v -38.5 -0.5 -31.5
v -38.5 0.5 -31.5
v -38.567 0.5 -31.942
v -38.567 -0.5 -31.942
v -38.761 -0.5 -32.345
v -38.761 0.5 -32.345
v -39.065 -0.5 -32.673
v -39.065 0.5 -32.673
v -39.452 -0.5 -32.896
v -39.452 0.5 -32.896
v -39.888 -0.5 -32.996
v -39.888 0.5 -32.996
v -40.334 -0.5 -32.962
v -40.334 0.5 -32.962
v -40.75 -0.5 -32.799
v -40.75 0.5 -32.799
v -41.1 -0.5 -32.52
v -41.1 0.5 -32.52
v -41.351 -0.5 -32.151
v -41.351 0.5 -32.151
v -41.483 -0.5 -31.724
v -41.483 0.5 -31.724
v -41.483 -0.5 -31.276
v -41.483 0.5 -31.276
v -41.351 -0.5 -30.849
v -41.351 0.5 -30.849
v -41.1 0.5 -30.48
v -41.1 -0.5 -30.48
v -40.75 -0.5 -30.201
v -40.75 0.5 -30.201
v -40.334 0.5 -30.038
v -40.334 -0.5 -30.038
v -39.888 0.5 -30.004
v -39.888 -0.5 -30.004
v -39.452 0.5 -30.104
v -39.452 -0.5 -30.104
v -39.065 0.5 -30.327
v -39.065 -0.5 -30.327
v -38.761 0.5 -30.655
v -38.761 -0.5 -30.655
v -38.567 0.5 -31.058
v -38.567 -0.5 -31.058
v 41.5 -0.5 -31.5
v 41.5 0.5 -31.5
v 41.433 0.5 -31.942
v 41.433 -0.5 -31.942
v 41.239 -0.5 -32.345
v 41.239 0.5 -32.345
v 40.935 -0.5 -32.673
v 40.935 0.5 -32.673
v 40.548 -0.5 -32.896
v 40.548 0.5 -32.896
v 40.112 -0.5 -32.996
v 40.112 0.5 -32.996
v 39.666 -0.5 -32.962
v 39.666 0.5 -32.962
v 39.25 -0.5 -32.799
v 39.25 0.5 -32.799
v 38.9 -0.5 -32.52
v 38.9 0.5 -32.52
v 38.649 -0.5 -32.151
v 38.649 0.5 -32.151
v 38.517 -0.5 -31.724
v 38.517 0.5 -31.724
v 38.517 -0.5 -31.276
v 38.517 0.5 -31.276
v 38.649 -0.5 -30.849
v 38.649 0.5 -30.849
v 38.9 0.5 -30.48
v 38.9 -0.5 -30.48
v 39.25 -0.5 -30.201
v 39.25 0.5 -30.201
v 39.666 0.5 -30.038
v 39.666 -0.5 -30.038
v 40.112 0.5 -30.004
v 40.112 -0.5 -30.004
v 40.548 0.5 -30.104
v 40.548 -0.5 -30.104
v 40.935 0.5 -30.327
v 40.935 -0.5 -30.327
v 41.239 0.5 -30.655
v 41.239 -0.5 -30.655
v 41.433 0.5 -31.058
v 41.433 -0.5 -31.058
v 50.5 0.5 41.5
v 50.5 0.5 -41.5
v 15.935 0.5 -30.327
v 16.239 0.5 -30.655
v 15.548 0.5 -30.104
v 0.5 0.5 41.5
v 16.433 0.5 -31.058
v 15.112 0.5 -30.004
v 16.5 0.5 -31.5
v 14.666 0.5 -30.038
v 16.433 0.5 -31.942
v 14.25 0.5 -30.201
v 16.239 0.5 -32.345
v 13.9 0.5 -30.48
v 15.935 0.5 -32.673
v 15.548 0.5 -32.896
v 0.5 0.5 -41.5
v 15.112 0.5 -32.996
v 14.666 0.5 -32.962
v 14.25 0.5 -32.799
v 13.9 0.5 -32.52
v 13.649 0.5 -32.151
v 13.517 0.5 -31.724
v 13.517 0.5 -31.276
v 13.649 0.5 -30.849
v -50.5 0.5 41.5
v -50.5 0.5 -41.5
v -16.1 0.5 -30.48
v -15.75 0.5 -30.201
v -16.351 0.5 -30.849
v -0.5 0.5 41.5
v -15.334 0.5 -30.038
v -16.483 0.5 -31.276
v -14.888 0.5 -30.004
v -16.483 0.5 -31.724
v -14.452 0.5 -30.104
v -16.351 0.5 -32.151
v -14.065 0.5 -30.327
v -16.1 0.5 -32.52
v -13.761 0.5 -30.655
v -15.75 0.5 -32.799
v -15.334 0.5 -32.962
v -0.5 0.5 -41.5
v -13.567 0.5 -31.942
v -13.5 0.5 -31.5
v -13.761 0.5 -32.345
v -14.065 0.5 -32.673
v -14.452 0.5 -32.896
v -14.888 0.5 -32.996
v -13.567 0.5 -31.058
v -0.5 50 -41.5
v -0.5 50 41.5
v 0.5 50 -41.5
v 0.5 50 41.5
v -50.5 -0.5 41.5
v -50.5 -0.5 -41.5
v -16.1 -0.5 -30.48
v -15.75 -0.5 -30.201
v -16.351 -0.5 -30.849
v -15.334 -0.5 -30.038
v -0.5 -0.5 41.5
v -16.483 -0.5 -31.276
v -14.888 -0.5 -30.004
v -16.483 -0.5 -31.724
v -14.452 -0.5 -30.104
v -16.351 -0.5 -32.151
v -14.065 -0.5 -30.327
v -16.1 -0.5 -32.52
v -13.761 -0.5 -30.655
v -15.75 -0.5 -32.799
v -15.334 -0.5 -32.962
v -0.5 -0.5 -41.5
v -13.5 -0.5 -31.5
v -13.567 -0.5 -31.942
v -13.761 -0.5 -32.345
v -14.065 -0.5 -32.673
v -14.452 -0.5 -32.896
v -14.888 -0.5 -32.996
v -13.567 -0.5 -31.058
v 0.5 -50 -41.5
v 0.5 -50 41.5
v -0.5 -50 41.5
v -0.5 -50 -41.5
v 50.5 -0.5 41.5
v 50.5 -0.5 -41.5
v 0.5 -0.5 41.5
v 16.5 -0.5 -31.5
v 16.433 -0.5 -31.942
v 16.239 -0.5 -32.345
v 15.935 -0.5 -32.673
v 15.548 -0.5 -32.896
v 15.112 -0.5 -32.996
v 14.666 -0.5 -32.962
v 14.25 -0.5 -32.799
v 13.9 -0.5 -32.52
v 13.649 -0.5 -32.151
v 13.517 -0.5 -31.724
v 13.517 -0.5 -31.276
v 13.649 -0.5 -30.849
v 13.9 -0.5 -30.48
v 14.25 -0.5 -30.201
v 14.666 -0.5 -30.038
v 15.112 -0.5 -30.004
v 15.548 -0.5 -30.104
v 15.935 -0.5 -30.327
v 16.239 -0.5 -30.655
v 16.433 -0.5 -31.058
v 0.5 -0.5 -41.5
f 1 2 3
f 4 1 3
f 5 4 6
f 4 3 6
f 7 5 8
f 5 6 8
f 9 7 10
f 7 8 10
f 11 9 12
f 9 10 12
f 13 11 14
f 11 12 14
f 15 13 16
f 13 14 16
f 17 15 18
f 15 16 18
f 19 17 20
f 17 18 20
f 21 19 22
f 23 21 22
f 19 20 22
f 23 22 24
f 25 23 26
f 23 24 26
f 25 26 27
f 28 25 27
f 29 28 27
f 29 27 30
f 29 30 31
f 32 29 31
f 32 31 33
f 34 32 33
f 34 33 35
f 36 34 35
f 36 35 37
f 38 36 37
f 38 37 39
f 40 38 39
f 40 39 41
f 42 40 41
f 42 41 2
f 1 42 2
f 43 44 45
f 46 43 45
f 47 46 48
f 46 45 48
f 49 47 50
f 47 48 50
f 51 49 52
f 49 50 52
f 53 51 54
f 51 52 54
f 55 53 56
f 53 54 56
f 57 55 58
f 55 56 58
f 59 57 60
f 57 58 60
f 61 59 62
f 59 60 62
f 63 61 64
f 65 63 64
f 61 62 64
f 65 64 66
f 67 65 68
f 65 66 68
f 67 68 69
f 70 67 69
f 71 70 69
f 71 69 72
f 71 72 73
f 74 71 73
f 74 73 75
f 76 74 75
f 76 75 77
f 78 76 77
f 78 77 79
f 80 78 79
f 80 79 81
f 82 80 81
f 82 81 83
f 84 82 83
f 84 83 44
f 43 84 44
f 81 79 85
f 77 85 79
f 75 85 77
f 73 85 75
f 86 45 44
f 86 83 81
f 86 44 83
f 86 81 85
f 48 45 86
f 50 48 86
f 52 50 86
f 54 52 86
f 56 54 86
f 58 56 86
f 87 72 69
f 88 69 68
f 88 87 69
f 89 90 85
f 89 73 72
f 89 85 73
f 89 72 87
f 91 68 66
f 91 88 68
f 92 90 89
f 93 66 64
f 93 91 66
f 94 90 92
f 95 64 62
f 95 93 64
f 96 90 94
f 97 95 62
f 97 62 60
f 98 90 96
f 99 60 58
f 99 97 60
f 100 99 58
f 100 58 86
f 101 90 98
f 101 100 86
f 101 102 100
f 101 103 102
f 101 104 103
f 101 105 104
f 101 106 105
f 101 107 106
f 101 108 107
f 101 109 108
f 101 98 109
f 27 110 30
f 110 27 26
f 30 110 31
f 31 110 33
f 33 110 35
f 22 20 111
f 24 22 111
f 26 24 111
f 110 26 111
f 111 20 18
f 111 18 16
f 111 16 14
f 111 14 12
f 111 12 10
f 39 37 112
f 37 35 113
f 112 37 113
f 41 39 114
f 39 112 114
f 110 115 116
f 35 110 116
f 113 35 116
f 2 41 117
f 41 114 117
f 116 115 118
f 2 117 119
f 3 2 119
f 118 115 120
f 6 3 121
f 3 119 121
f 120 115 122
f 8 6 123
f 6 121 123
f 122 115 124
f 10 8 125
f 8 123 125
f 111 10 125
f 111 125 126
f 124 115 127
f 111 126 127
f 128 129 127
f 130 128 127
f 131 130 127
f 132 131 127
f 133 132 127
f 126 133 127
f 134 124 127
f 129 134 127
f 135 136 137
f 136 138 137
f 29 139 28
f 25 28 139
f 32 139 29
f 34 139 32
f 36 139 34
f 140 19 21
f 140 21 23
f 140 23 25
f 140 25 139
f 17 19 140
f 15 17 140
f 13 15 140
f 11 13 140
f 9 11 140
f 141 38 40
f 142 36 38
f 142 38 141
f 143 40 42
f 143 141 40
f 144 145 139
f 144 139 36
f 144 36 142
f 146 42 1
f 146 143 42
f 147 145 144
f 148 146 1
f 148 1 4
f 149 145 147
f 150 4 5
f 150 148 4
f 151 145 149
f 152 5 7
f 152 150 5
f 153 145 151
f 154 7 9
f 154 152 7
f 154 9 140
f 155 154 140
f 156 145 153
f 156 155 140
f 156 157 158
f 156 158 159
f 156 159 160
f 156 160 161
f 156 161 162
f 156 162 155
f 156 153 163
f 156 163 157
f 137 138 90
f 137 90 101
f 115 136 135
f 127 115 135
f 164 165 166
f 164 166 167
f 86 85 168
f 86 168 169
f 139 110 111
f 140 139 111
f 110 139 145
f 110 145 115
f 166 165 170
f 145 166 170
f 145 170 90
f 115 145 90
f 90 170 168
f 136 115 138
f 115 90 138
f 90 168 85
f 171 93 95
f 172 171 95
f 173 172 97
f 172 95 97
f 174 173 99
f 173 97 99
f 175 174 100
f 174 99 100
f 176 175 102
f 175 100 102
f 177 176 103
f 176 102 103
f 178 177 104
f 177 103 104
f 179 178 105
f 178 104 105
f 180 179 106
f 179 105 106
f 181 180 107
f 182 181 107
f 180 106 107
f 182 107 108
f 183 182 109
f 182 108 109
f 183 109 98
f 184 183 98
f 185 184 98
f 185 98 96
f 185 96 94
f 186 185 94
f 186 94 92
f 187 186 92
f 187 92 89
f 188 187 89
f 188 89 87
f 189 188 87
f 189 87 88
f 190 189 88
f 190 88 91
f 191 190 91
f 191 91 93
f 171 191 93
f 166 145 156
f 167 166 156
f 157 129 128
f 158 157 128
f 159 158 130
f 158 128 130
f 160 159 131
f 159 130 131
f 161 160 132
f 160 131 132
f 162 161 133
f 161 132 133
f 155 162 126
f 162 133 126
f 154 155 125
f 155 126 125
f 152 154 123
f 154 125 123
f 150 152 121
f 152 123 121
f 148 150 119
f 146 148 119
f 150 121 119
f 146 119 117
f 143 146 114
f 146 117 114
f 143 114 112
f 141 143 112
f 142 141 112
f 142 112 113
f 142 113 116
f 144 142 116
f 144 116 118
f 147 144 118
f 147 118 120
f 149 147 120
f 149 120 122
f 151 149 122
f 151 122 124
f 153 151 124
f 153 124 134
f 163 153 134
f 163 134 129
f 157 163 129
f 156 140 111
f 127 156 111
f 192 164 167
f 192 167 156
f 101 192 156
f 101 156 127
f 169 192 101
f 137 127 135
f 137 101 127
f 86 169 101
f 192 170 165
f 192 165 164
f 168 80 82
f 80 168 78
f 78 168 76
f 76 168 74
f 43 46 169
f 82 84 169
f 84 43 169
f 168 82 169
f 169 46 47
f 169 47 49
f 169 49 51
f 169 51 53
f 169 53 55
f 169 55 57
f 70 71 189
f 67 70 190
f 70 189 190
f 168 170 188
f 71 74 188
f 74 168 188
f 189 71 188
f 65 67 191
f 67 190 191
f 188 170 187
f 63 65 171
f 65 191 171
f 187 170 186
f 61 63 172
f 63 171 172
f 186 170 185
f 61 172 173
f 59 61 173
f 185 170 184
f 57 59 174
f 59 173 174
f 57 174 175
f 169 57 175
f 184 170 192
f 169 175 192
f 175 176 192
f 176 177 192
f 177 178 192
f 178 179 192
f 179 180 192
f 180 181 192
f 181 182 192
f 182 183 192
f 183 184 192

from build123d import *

# Parameters (mm, degrees)
BOSS_EXTRUDE1_DEPTH      = 0.5
BOSS_EXTRUDE1_DEPTH_BACK = 0.5
SKETCH1_W                = 83
SKETCH1_H                = 100
BOSS_EXTRUDE2_DEPTH      = 50
BOSS_EXTRUDE2_DEPTH_BACK = 51
SKETCH2_W                = 83
SKETCH2_H                = 1
CUT_EXTRUDE1_REACH       = 84.6
SKETCH3_R                = 1.5


with BuildPart() as part:
    # Sketch1 → Boss-Extrude1 (new, two sides: drawn at the far end of the back side and taken through both)
    with BuildSketch(Plane(origin=(0, 0, 0), x_dir=(0, 0, -1), z_dir=(1, 0, 0)).offset(-BOSS_EXTRUDE1_DEPTH_BACK)):
        Rectangle(SKETCH1_W, SKETCH1_H)
    extrude(amount=BOSS_EXTRUDE1_DEPTH + BOSS_EXTRUDE1_DEPTH_BACK)

    # Sketch2 → Boss-Extrude2 (add, two sides: drawn at the far end of the back side and taken through both)
    with BuildSketch(Plane(origin=(0.5, 0, 0), x_dir=(0, 0, -1), z_dir=(1, 0, 0)).offset(-BOSS_EXTRUDE2_DEPTH_BACK)):
        Rectangle(SKETCH2_W, SKETCH2_H)
    extrude(amount=BOSS_EXTRUDE2_DEPTH + BOSS_EXTRUDE2_DEPTH_BACK)

    # Sketch3 → Cut-Extrude1 (cut, up to next)
    with BuildSketch(Plane(origin=(0, 0.5, 0), x_dir=(1, 0, 0), z_dir=(0, 1, 0)), mode=Mode.PRIVATE) as cut_extrude1_sk1:
        with Locations((15, 31.5)):
            Circle(SKETCH3_R)
    cut_extrude1_tool1 = extrude(cut_extrude1_sk1.sketch, amount=-CUT_EXTRUDE1_REACH, mode=Mode.PRIVATE) & part.part
    # Sketch3 → Cut-Extrude1 (cut, up to next)
    with BuildSketch(Plane(origin=(0, 0.5, 0), x_dir=(1, 0, 0), z_dir=(0, 1, 0)), mode=Mode.PRIVATE) as cut_extrude1_sk2:
        with Locations((40, 31.5)):
            Circle(SKETCH3_R)
    cut_extrude1_tool2 = extrude(cut_extrude1_sk2.sketch, amount=-CUT_EXTRUDE1_REACH, mode=Mode.PRIVATE) & part.part
    # Sketch3 → Cut-Extrude1 (cut, up to next)
    with BuildSketch(Plane(origin=(0, 0.5, 0), x_dir=(1, 0, 0), z_dir=(0, 1, 0)), mode=Mode.PRIVATE) as cut_extrude1_sk3:
        with Locations((-40, 31.5)):
            Circle(SKETCH3_R)
    cut_extrude1_tool3 = extrude(cut_extrude1_sk3.sketch, amount=-CUT_EXTRUDE1_REACH, mode=Mode.PRIVATE) & part.part
    # Sketch3 → Cut-Extrude1 (cut, up to next)
    with BuildSketch(Plane(origin=(0, 0.5, 0), x_dir=(1, 0, 0), z_dir=(0, 1, 0)), mode=Mode.PRIVATE) as cut_extrude1_sk4:
        with Locations((-15, 31.5)):
            Circle(SKETCH3_R)
    cut_extrude1_tool4 = extrude(cut_extrude1_sk4.sketch, amount=-CUT_EXTRUDE1_REACH, mode=Mode.PRIVATE) & part.part
    add(cut_extrude1_tool1.solids().sort_by_distance((15, 0.5, -31.5))[0], mode=Mode.SUBTRACT)
    add(cut_extrude1_tool2.solids().sort_by_distance((40, 0.5, -31.5))[0], mode=Mode.SUBTRACT)
    add(cut_extrude1_tool3.solids().sort_by_distance((-40, 0.5, -31.5))[0], mode=Mode.SUBTRACT)
    add(cut_extrude1_tool4.solids().sort_by_distance((-15, 0.5, -31.5))[0], mode=Mode.SUBTRACT)


solid = part.part
